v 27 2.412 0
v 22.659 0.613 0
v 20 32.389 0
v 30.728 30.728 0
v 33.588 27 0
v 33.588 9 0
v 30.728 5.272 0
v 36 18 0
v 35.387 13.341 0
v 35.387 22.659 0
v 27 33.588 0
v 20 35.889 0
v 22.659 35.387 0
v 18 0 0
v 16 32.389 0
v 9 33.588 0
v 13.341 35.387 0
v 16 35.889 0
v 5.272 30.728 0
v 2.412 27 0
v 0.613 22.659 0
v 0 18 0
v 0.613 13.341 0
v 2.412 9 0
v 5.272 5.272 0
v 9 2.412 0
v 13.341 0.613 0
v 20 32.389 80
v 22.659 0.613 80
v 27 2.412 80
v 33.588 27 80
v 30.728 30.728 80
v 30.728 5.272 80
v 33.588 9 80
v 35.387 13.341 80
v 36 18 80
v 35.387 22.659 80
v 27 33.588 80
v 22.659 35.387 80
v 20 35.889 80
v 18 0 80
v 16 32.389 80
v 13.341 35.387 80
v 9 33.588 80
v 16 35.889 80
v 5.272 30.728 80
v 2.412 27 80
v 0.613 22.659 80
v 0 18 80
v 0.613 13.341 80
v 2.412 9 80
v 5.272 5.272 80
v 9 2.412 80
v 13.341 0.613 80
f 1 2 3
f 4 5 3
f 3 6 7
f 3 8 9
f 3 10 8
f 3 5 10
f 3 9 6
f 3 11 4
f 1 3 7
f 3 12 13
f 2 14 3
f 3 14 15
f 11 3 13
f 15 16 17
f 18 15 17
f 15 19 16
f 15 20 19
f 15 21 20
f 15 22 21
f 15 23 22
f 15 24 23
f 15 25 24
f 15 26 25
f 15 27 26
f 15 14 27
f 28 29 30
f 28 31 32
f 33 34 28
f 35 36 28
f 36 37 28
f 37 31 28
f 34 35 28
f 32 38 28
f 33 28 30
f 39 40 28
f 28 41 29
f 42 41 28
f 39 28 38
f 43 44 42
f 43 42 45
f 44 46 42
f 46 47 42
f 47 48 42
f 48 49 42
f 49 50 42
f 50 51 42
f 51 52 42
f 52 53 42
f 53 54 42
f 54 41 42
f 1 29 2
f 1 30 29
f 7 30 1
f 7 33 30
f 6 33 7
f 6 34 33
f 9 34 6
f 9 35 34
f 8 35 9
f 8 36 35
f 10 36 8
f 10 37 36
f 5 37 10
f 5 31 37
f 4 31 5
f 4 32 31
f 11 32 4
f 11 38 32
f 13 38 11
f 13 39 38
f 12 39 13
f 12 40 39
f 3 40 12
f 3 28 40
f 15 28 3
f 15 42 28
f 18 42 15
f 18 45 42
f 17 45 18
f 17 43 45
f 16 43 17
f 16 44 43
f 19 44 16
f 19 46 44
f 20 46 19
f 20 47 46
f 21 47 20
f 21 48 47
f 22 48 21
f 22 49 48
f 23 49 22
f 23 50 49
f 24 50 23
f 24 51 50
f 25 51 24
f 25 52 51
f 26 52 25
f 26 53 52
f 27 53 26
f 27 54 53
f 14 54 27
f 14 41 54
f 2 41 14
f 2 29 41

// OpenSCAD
$fn = 32;

// ----------------------------------------------------------------------
// Keyway shaft: d36 shaft, key 4 x 3.5 mm
// ----------------------------------------------------------------------

// --- parameters (mm) ---
shaft_r = 18;             // shaft radius
key_w = 4;                // keyway width
key_d = 3.5;              // keyway depth below the surface line
plate_t = 80;             // shaft length, Z (extrusion height)
fit_tol = 0.1;            // declared fit tolerance (prompt contract)
free_tol = 0.3;           // declared free tolerance (prompt contract)

shaft_d = 2 * shaft_r;  // shaft diameter
circle_step = 15;  // polygon sampling step, degrees

profile = [[13.341, 35.387], [9, 33.588], [5.272, 30.728], [2.412, 27], [0.613, 22.659], [0, 18], [0.613, 13.341], [2.412, 9], [5.272, 5.272], [9, 2.412], [13.341, 0.613], [18, 0], [22.659, 0.613], [27, 2.412], [30.728, 5.272], [33.588, 9], [35.387, 13.341], [36, 18], [35.387, 22.659], [33.588, 27], [30.728, 30.728], [27, 33.588], [22.659, 35.387], [20, 35.889], [20, 32.389], [16, 32.389], [16, 35.889]];  // primary outline, 27 points, counter clockwise

// --- the one profile operation ---
linear_extrude(height = plate_t) polygon(points = profile);
